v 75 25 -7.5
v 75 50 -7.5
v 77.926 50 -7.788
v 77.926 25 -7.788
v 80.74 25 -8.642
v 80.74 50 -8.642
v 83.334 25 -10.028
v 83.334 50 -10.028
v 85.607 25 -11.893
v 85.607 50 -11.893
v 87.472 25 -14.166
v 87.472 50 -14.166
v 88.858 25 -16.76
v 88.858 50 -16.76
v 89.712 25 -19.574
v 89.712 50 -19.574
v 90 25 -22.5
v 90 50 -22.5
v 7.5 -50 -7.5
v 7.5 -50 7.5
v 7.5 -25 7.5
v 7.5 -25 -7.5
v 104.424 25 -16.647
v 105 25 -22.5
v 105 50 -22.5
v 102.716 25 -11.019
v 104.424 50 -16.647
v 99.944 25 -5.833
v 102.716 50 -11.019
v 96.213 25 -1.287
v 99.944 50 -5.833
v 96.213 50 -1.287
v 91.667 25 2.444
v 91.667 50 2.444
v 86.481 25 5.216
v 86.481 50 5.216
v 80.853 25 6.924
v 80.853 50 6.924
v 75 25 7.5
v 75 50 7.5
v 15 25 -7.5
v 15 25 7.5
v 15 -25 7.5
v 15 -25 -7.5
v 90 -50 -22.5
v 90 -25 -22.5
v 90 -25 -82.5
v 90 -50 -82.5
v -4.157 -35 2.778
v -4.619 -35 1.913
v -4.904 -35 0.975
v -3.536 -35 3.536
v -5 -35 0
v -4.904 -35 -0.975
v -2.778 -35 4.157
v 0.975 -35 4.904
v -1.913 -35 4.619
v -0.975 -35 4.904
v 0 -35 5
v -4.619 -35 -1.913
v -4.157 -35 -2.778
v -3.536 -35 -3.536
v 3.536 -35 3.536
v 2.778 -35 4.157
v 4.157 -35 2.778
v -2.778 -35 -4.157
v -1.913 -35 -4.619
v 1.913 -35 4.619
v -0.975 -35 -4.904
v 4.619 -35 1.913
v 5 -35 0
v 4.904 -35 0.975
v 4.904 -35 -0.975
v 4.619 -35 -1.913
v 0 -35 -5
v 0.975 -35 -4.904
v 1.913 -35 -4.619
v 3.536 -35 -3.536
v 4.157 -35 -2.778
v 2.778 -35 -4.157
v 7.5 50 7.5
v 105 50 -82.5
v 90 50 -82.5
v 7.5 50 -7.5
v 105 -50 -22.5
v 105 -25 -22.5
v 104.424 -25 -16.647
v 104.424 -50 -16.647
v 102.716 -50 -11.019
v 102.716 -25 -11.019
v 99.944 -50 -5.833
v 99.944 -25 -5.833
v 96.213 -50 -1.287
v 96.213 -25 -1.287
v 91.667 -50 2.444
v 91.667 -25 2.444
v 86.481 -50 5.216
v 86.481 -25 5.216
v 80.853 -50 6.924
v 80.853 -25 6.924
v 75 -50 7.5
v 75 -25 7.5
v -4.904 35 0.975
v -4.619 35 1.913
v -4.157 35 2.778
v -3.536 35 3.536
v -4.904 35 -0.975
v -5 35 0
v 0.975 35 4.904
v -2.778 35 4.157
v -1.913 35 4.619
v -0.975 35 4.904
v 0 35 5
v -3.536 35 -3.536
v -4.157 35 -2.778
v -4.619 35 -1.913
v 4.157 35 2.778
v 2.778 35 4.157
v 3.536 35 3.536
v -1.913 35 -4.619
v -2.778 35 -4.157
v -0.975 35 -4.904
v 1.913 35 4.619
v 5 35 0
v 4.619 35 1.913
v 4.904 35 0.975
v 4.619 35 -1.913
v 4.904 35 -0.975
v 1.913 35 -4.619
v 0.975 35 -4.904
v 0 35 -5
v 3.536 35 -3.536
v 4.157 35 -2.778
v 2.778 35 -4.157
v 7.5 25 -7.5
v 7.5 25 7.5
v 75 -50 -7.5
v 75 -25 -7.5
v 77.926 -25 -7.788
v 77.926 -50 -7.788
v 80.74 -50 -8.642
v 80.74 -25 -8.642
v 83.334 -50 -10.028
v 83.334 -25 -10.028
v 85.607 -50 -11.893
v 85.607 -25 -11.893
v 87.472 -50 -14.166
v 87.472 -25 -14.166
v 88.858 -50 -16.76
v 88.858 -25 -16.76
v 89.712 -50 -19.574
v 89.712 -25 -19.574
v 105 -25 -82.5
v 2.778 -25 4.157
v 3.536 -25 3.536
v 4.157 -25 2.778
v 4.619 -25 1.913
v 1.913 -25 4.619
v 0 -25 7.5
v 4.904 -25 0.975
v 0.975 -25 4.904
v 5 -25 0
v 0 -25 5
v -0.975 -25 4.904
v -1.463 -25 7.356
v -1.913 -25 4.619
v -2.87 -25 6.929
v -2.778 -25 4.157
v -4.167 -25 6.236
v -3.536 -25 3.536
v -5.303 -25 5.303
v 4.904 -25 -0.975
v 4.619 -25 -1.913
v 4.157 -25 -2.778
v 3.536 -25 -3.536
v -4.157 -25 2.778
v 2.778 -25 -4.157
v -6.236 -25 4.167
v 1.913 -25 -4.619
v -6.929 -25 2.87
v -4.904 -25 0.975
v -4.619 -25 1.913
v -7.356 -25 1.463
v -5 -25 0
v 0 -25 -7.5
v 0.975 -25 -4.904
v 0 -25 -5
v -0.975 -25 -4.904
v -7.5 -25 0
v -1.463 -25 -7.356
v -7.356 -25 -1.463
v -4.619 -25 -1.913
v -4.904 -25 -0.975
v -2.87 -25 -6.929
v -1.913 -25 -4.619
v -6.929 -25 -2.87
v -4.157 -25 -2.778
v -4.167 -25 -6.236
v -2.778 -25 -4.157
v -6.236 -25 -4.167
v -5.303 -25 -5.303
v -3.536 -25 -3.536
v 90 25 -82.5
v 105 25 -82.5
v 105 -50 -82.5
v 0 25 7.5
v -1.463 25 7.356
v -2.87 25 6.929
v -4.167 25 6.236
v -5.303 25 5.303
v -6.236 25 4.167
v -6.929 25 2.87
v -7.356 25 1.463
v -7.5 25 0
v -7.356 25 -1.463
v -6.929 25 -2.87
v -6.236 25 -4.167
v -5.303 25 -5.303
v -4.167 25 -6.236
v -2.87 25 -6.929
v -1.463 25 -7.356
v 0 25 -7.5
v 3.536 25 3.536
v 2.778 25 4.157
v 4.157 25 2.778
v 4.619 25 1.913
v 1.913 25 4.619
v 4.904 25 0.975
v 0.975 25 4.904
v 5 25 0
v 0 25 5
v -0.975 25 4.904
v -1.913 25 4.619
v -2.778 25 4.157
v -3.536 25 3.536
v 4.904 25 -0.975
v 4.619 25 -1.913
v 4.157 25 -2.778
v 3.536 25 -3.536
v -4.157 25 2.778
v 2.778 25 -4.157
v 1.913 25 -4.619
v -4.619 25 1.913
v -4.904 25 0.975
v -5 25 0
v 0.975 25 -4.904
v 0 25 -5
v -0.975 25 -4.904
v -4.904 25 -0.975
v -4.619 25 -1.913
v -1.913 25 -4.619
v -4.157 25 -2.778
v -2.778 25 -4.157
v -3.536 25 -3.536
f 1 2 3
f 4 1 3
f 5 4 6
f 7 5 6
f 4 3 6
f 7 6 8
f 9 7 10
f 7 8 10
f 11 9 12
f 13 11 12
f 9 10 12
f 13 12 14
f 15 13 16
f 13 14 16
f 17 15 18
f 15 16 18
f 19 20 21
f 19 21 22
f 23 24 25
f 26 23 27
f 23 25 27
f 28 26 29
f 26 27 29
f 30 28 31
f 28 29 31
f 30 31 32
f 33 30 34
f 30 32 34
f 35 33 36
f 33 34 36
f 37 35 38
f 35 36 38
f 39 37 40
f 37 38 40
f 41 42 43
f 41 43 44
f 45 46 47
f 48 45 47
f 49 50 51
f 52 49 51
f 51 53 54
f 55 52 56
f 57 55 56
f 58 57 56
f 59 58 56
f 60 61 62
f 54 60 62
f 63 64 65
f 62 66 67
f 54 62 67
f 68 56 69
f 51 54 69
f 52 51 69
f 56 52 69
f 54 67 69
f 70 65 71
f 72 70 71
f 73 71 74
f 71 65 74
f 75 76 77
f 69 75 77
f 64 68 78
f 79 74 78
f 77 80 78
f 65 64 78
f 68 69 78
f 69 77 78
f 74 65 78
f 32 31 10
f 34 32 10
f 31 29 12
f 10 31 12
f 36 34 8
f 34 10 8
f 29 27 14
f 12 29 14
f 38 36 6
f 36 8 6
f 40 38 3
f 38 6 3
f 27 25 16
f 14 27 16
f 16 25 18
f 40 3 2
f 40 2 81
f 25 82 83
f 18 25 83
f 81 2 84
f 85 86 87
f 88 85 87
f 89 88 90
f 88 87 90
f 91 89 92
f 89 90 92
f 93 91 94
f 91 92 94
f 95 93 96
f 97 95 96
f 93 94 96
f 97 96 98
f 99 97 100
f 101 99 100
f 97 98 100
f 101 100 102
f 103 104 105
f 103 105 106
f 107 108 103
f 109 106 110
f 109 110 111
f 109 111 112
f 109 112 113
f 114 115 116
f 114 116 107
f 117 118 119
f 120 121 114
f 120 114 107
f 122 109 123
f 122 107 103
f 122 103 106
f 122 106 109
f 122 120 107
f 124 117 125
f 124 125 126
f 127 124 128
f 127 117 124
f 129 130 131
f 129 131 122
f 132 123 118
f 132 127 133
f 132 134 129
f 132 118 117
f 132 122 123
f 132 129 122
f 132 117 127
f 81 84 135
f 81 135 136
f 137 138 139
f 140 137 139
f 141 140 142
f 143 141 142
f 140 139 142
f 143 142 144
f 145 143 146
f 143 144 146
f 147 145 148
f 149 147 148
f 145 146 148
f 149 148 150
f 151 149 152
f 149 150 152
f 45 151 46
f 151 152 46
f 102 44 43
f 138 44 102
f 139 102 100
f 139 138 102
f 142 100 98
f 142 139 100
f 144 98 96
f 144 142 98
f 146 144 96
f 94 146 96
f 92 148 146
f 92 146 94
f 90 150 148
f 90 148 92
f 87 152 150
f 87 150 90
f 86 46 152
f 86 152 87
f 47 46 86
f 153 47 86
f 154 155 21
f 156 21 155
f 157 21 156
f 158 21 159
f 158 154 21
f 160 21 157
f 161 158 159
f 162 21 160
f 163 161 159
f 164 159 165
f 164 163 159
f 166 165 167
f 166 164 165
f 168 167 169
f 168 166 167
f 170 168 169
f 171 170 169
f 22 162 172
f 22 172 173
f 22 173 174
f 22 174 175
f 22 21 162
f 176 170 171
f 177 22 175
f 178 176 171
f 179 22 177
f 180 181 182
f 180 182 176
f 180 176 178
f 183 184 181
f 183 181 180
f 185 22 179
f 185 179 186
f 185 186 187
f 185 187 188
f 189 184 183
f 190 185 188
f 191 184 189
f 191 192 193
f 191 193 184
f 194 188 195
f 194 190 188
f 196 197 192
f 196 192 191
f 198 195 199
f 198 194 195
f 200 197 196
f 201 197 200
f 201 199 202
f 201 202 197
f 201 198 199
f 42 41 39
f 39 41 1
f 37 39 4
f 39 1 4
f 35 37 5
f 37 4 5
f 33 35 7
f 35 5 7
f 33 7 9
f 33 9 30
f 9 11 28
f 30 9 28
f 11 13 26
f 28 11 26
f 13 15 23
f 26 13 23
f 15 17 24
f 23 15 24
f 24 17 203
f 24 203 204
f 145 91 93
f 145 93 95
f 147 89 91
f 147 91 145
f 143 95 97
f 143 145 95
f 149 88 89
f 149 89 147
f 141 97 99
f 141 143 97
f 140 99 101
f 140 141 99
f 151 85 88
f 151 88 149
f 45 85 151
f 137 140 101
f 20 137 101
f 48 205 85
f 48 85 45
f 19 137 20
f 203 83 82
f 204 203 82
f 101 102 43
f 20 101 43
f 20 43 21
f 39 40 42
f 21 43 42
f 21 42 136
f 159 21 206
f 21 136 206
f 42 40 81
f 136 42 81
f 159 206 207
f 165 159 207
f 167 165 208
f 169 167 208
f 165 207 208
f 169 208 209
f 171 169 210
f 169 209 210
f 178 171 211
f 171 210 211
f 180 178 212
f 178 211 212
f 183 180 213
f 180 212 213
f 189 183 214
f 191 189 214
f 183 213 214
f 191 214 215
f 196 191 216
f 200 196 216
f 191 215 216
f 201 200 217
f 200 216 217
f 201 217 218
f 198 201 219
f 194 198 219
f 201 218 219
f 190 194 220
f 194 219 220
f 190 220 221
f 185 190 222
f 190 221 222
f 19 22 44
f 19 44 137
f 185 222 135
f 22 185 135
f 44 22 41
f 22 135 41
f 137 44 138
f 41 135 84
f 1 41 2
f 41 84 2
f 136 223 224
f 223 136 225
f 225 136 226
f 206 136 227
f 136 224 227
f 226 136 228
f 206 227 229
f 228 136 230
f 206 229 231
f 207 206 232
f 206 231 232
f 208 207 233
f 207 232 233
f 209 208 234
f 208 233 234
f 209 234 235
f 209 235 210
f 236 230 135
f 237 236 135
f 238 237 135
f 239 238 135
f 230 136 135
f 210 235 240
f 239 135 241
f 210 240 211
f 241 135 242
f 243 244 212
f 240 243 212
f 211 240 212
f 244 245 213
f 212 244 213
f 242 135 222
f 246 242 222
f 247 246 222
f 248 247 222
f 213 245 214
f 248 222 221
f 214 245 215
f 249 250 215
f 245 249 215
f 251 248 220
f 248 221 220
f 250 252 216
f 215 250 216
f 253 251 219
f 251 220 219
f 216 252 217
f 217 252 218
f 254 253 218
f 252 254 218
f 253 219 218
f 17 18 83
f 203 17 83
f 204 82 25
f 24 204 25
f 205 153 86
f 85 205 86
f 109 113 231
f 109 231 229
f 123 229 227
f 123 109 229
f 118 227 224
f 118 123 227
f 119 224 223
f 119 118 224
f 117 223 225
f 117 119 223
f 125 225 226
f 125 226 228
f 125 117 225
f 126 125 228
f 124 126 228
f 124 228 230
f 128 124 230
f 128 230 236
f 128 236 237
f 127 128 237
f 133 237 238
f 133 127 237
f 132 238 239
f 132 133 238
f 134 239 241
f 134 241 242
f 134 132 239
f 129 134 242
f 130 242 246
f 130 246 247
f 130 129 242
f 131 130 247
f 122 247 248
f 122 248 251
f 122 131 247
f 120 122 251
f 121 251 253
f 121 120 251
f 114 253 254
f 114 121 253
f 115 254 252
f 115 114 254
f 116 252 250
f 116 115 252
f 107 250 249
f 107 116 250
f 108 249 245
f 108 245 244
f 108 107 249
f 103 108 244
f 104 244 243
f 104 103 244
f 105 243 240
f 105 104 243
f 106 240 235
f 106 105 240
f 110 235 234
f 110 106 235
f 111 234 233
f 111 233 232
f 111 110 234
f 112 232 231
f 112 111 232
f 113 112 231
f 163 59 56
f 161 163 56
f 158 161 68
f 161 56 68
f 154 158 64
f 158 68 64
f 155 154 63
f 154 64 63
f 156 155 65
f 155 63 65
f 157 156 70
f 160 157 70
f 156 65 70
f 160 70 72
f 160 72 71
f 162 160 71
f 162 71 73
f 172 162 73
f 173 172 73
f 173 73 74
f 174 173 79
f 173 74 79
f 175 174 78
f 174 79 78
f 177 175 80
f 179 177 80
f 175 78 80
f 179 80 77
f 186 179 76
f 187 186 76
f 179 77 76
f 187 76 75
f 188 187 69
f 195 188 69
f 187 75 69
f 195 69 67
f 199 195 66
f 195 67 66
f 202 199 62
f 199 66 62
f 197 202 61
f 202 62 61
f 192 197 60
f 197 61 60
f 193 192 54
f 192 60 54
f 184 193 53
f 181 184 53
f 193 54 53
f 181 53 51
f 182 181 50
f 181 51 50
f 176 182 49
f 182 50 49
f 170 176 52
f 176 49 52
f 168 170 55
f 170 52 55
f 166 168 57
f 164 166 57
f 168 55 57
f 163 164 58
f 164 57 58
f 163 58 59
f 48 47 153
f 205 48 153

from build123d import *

# Parameters (mm, degrees)
EXTRUDE_1_DEPTH     = 50
CUT_EXTRUDE_START   = -50
SKETCH_2_W          = 99.785929991
SKETCH_2_H          = 100
CUT_EXTRUDE_1_DEPTH = 50
SKETCH_7_W          = 19.044434788
SKETCH_7_H          = 15
CUT_EXTRUDE_5_DEPTH = 15
SKETCH_9_R          = 5
CUT_EXTRUDE_6_DEPTH = 10


with BuildPart() as part:
    # 草图1 → 凸台-拉伸1 (new, symmetric)
    with BuildSketch(Plane(origin=(0, 0, 0), x_dir=(1, 0, 0), z_dir=(0, 1, 0))):
        with BuildLine():
            Line((0, 7.5), (75, 7.5))
            ThreePointArc((75, 7.5), (85.606601718, 11.893398282), (90, 22.5))
            Line((90, 22.5), (90, 82.5))
            Line((90, 82.5), (105, 82.5))
            Line((105, 82.5), (105, 22.5))
            ThreePointArc((105, 22.5), (96.213203436, 1.286796564), (75, -7.5))
            Line((75, -7.5), (0, -7.5))
            ThreePointArc((0, -7.5), (-7.5, 0), (0, 7.5))
        make_face()
    extrude(amount=EXTRUDE_1_DEPTH, both=True)

    # 草图2 → 切除-拉伸1 (cut)
    with BuildSketch(Plane(origin=(0, 25, 0), x_dir=(1, 0, 0), z_dir=(0, 1, 0)).offset(CUT_EXTRUDE_START)):
        with Locations((64.892964996, 39.075948396)):
            Rectangle(SKETCH_2_W, SKETCH_2_H)
    extrude(amount=CUT_EXTRUDE_1_DEPTH, mode=Mode.SUBTRACT)

    # 草图7 → 切除-拉伸5 (cut)
    with BuildSketch(Plane(origin=(0, 50, 0), x_dir=(1, 0, 0), z_dir=(0, 1, 0))):
        with Locations((-2.022217394, 0)):
            Rectangle(SKETCH_7_W, SKETCH_7_H)
    cut_extrude_5 = extrude(amount=-CUT_EXTRUDE_5_DEPTH, mode=Mode.SUBTRACT)

    # 镜向1: 切除-拉伸5 across plane
    add(cut_extrude_5.mirror(Plane.ZX), mode=Mode.SUBTRACT)

    # 草图9 → 切除-拉伸6 (cut)
    with BuildSketch(Plane(origin=(0, 35, 0), x_dir=(1, 0, 0), z_dir=(0, 1, 0))):
        with BuildLine():
            Line((0, 7.5), (7.5, 7.5))
            Line((7.5, 7.5), (7.5, -7.5))
            Line((7.5, -7.5), (0, -7.5))
            ThreePointArc((0, -7.5), (-7.5, 0), (0, 7.5))
        make_face()
        with Locations(Location((0, 0, 0), (0, 0, 270))):
            Circle(SKETCH_9_R, mode=Mode.SUBTRACT)
    cut_extrude_6 = extrude(amount=-CUT_EXTRUDE_6_DEPTH, mode=Mode.SUBTRACT)

    # 镜向2: 切除-拉伸6 across plane
    add(cut_extrude_6.mirror(Plane.ZX), mode=Mode.SUBTRACT)


solid = part.part
